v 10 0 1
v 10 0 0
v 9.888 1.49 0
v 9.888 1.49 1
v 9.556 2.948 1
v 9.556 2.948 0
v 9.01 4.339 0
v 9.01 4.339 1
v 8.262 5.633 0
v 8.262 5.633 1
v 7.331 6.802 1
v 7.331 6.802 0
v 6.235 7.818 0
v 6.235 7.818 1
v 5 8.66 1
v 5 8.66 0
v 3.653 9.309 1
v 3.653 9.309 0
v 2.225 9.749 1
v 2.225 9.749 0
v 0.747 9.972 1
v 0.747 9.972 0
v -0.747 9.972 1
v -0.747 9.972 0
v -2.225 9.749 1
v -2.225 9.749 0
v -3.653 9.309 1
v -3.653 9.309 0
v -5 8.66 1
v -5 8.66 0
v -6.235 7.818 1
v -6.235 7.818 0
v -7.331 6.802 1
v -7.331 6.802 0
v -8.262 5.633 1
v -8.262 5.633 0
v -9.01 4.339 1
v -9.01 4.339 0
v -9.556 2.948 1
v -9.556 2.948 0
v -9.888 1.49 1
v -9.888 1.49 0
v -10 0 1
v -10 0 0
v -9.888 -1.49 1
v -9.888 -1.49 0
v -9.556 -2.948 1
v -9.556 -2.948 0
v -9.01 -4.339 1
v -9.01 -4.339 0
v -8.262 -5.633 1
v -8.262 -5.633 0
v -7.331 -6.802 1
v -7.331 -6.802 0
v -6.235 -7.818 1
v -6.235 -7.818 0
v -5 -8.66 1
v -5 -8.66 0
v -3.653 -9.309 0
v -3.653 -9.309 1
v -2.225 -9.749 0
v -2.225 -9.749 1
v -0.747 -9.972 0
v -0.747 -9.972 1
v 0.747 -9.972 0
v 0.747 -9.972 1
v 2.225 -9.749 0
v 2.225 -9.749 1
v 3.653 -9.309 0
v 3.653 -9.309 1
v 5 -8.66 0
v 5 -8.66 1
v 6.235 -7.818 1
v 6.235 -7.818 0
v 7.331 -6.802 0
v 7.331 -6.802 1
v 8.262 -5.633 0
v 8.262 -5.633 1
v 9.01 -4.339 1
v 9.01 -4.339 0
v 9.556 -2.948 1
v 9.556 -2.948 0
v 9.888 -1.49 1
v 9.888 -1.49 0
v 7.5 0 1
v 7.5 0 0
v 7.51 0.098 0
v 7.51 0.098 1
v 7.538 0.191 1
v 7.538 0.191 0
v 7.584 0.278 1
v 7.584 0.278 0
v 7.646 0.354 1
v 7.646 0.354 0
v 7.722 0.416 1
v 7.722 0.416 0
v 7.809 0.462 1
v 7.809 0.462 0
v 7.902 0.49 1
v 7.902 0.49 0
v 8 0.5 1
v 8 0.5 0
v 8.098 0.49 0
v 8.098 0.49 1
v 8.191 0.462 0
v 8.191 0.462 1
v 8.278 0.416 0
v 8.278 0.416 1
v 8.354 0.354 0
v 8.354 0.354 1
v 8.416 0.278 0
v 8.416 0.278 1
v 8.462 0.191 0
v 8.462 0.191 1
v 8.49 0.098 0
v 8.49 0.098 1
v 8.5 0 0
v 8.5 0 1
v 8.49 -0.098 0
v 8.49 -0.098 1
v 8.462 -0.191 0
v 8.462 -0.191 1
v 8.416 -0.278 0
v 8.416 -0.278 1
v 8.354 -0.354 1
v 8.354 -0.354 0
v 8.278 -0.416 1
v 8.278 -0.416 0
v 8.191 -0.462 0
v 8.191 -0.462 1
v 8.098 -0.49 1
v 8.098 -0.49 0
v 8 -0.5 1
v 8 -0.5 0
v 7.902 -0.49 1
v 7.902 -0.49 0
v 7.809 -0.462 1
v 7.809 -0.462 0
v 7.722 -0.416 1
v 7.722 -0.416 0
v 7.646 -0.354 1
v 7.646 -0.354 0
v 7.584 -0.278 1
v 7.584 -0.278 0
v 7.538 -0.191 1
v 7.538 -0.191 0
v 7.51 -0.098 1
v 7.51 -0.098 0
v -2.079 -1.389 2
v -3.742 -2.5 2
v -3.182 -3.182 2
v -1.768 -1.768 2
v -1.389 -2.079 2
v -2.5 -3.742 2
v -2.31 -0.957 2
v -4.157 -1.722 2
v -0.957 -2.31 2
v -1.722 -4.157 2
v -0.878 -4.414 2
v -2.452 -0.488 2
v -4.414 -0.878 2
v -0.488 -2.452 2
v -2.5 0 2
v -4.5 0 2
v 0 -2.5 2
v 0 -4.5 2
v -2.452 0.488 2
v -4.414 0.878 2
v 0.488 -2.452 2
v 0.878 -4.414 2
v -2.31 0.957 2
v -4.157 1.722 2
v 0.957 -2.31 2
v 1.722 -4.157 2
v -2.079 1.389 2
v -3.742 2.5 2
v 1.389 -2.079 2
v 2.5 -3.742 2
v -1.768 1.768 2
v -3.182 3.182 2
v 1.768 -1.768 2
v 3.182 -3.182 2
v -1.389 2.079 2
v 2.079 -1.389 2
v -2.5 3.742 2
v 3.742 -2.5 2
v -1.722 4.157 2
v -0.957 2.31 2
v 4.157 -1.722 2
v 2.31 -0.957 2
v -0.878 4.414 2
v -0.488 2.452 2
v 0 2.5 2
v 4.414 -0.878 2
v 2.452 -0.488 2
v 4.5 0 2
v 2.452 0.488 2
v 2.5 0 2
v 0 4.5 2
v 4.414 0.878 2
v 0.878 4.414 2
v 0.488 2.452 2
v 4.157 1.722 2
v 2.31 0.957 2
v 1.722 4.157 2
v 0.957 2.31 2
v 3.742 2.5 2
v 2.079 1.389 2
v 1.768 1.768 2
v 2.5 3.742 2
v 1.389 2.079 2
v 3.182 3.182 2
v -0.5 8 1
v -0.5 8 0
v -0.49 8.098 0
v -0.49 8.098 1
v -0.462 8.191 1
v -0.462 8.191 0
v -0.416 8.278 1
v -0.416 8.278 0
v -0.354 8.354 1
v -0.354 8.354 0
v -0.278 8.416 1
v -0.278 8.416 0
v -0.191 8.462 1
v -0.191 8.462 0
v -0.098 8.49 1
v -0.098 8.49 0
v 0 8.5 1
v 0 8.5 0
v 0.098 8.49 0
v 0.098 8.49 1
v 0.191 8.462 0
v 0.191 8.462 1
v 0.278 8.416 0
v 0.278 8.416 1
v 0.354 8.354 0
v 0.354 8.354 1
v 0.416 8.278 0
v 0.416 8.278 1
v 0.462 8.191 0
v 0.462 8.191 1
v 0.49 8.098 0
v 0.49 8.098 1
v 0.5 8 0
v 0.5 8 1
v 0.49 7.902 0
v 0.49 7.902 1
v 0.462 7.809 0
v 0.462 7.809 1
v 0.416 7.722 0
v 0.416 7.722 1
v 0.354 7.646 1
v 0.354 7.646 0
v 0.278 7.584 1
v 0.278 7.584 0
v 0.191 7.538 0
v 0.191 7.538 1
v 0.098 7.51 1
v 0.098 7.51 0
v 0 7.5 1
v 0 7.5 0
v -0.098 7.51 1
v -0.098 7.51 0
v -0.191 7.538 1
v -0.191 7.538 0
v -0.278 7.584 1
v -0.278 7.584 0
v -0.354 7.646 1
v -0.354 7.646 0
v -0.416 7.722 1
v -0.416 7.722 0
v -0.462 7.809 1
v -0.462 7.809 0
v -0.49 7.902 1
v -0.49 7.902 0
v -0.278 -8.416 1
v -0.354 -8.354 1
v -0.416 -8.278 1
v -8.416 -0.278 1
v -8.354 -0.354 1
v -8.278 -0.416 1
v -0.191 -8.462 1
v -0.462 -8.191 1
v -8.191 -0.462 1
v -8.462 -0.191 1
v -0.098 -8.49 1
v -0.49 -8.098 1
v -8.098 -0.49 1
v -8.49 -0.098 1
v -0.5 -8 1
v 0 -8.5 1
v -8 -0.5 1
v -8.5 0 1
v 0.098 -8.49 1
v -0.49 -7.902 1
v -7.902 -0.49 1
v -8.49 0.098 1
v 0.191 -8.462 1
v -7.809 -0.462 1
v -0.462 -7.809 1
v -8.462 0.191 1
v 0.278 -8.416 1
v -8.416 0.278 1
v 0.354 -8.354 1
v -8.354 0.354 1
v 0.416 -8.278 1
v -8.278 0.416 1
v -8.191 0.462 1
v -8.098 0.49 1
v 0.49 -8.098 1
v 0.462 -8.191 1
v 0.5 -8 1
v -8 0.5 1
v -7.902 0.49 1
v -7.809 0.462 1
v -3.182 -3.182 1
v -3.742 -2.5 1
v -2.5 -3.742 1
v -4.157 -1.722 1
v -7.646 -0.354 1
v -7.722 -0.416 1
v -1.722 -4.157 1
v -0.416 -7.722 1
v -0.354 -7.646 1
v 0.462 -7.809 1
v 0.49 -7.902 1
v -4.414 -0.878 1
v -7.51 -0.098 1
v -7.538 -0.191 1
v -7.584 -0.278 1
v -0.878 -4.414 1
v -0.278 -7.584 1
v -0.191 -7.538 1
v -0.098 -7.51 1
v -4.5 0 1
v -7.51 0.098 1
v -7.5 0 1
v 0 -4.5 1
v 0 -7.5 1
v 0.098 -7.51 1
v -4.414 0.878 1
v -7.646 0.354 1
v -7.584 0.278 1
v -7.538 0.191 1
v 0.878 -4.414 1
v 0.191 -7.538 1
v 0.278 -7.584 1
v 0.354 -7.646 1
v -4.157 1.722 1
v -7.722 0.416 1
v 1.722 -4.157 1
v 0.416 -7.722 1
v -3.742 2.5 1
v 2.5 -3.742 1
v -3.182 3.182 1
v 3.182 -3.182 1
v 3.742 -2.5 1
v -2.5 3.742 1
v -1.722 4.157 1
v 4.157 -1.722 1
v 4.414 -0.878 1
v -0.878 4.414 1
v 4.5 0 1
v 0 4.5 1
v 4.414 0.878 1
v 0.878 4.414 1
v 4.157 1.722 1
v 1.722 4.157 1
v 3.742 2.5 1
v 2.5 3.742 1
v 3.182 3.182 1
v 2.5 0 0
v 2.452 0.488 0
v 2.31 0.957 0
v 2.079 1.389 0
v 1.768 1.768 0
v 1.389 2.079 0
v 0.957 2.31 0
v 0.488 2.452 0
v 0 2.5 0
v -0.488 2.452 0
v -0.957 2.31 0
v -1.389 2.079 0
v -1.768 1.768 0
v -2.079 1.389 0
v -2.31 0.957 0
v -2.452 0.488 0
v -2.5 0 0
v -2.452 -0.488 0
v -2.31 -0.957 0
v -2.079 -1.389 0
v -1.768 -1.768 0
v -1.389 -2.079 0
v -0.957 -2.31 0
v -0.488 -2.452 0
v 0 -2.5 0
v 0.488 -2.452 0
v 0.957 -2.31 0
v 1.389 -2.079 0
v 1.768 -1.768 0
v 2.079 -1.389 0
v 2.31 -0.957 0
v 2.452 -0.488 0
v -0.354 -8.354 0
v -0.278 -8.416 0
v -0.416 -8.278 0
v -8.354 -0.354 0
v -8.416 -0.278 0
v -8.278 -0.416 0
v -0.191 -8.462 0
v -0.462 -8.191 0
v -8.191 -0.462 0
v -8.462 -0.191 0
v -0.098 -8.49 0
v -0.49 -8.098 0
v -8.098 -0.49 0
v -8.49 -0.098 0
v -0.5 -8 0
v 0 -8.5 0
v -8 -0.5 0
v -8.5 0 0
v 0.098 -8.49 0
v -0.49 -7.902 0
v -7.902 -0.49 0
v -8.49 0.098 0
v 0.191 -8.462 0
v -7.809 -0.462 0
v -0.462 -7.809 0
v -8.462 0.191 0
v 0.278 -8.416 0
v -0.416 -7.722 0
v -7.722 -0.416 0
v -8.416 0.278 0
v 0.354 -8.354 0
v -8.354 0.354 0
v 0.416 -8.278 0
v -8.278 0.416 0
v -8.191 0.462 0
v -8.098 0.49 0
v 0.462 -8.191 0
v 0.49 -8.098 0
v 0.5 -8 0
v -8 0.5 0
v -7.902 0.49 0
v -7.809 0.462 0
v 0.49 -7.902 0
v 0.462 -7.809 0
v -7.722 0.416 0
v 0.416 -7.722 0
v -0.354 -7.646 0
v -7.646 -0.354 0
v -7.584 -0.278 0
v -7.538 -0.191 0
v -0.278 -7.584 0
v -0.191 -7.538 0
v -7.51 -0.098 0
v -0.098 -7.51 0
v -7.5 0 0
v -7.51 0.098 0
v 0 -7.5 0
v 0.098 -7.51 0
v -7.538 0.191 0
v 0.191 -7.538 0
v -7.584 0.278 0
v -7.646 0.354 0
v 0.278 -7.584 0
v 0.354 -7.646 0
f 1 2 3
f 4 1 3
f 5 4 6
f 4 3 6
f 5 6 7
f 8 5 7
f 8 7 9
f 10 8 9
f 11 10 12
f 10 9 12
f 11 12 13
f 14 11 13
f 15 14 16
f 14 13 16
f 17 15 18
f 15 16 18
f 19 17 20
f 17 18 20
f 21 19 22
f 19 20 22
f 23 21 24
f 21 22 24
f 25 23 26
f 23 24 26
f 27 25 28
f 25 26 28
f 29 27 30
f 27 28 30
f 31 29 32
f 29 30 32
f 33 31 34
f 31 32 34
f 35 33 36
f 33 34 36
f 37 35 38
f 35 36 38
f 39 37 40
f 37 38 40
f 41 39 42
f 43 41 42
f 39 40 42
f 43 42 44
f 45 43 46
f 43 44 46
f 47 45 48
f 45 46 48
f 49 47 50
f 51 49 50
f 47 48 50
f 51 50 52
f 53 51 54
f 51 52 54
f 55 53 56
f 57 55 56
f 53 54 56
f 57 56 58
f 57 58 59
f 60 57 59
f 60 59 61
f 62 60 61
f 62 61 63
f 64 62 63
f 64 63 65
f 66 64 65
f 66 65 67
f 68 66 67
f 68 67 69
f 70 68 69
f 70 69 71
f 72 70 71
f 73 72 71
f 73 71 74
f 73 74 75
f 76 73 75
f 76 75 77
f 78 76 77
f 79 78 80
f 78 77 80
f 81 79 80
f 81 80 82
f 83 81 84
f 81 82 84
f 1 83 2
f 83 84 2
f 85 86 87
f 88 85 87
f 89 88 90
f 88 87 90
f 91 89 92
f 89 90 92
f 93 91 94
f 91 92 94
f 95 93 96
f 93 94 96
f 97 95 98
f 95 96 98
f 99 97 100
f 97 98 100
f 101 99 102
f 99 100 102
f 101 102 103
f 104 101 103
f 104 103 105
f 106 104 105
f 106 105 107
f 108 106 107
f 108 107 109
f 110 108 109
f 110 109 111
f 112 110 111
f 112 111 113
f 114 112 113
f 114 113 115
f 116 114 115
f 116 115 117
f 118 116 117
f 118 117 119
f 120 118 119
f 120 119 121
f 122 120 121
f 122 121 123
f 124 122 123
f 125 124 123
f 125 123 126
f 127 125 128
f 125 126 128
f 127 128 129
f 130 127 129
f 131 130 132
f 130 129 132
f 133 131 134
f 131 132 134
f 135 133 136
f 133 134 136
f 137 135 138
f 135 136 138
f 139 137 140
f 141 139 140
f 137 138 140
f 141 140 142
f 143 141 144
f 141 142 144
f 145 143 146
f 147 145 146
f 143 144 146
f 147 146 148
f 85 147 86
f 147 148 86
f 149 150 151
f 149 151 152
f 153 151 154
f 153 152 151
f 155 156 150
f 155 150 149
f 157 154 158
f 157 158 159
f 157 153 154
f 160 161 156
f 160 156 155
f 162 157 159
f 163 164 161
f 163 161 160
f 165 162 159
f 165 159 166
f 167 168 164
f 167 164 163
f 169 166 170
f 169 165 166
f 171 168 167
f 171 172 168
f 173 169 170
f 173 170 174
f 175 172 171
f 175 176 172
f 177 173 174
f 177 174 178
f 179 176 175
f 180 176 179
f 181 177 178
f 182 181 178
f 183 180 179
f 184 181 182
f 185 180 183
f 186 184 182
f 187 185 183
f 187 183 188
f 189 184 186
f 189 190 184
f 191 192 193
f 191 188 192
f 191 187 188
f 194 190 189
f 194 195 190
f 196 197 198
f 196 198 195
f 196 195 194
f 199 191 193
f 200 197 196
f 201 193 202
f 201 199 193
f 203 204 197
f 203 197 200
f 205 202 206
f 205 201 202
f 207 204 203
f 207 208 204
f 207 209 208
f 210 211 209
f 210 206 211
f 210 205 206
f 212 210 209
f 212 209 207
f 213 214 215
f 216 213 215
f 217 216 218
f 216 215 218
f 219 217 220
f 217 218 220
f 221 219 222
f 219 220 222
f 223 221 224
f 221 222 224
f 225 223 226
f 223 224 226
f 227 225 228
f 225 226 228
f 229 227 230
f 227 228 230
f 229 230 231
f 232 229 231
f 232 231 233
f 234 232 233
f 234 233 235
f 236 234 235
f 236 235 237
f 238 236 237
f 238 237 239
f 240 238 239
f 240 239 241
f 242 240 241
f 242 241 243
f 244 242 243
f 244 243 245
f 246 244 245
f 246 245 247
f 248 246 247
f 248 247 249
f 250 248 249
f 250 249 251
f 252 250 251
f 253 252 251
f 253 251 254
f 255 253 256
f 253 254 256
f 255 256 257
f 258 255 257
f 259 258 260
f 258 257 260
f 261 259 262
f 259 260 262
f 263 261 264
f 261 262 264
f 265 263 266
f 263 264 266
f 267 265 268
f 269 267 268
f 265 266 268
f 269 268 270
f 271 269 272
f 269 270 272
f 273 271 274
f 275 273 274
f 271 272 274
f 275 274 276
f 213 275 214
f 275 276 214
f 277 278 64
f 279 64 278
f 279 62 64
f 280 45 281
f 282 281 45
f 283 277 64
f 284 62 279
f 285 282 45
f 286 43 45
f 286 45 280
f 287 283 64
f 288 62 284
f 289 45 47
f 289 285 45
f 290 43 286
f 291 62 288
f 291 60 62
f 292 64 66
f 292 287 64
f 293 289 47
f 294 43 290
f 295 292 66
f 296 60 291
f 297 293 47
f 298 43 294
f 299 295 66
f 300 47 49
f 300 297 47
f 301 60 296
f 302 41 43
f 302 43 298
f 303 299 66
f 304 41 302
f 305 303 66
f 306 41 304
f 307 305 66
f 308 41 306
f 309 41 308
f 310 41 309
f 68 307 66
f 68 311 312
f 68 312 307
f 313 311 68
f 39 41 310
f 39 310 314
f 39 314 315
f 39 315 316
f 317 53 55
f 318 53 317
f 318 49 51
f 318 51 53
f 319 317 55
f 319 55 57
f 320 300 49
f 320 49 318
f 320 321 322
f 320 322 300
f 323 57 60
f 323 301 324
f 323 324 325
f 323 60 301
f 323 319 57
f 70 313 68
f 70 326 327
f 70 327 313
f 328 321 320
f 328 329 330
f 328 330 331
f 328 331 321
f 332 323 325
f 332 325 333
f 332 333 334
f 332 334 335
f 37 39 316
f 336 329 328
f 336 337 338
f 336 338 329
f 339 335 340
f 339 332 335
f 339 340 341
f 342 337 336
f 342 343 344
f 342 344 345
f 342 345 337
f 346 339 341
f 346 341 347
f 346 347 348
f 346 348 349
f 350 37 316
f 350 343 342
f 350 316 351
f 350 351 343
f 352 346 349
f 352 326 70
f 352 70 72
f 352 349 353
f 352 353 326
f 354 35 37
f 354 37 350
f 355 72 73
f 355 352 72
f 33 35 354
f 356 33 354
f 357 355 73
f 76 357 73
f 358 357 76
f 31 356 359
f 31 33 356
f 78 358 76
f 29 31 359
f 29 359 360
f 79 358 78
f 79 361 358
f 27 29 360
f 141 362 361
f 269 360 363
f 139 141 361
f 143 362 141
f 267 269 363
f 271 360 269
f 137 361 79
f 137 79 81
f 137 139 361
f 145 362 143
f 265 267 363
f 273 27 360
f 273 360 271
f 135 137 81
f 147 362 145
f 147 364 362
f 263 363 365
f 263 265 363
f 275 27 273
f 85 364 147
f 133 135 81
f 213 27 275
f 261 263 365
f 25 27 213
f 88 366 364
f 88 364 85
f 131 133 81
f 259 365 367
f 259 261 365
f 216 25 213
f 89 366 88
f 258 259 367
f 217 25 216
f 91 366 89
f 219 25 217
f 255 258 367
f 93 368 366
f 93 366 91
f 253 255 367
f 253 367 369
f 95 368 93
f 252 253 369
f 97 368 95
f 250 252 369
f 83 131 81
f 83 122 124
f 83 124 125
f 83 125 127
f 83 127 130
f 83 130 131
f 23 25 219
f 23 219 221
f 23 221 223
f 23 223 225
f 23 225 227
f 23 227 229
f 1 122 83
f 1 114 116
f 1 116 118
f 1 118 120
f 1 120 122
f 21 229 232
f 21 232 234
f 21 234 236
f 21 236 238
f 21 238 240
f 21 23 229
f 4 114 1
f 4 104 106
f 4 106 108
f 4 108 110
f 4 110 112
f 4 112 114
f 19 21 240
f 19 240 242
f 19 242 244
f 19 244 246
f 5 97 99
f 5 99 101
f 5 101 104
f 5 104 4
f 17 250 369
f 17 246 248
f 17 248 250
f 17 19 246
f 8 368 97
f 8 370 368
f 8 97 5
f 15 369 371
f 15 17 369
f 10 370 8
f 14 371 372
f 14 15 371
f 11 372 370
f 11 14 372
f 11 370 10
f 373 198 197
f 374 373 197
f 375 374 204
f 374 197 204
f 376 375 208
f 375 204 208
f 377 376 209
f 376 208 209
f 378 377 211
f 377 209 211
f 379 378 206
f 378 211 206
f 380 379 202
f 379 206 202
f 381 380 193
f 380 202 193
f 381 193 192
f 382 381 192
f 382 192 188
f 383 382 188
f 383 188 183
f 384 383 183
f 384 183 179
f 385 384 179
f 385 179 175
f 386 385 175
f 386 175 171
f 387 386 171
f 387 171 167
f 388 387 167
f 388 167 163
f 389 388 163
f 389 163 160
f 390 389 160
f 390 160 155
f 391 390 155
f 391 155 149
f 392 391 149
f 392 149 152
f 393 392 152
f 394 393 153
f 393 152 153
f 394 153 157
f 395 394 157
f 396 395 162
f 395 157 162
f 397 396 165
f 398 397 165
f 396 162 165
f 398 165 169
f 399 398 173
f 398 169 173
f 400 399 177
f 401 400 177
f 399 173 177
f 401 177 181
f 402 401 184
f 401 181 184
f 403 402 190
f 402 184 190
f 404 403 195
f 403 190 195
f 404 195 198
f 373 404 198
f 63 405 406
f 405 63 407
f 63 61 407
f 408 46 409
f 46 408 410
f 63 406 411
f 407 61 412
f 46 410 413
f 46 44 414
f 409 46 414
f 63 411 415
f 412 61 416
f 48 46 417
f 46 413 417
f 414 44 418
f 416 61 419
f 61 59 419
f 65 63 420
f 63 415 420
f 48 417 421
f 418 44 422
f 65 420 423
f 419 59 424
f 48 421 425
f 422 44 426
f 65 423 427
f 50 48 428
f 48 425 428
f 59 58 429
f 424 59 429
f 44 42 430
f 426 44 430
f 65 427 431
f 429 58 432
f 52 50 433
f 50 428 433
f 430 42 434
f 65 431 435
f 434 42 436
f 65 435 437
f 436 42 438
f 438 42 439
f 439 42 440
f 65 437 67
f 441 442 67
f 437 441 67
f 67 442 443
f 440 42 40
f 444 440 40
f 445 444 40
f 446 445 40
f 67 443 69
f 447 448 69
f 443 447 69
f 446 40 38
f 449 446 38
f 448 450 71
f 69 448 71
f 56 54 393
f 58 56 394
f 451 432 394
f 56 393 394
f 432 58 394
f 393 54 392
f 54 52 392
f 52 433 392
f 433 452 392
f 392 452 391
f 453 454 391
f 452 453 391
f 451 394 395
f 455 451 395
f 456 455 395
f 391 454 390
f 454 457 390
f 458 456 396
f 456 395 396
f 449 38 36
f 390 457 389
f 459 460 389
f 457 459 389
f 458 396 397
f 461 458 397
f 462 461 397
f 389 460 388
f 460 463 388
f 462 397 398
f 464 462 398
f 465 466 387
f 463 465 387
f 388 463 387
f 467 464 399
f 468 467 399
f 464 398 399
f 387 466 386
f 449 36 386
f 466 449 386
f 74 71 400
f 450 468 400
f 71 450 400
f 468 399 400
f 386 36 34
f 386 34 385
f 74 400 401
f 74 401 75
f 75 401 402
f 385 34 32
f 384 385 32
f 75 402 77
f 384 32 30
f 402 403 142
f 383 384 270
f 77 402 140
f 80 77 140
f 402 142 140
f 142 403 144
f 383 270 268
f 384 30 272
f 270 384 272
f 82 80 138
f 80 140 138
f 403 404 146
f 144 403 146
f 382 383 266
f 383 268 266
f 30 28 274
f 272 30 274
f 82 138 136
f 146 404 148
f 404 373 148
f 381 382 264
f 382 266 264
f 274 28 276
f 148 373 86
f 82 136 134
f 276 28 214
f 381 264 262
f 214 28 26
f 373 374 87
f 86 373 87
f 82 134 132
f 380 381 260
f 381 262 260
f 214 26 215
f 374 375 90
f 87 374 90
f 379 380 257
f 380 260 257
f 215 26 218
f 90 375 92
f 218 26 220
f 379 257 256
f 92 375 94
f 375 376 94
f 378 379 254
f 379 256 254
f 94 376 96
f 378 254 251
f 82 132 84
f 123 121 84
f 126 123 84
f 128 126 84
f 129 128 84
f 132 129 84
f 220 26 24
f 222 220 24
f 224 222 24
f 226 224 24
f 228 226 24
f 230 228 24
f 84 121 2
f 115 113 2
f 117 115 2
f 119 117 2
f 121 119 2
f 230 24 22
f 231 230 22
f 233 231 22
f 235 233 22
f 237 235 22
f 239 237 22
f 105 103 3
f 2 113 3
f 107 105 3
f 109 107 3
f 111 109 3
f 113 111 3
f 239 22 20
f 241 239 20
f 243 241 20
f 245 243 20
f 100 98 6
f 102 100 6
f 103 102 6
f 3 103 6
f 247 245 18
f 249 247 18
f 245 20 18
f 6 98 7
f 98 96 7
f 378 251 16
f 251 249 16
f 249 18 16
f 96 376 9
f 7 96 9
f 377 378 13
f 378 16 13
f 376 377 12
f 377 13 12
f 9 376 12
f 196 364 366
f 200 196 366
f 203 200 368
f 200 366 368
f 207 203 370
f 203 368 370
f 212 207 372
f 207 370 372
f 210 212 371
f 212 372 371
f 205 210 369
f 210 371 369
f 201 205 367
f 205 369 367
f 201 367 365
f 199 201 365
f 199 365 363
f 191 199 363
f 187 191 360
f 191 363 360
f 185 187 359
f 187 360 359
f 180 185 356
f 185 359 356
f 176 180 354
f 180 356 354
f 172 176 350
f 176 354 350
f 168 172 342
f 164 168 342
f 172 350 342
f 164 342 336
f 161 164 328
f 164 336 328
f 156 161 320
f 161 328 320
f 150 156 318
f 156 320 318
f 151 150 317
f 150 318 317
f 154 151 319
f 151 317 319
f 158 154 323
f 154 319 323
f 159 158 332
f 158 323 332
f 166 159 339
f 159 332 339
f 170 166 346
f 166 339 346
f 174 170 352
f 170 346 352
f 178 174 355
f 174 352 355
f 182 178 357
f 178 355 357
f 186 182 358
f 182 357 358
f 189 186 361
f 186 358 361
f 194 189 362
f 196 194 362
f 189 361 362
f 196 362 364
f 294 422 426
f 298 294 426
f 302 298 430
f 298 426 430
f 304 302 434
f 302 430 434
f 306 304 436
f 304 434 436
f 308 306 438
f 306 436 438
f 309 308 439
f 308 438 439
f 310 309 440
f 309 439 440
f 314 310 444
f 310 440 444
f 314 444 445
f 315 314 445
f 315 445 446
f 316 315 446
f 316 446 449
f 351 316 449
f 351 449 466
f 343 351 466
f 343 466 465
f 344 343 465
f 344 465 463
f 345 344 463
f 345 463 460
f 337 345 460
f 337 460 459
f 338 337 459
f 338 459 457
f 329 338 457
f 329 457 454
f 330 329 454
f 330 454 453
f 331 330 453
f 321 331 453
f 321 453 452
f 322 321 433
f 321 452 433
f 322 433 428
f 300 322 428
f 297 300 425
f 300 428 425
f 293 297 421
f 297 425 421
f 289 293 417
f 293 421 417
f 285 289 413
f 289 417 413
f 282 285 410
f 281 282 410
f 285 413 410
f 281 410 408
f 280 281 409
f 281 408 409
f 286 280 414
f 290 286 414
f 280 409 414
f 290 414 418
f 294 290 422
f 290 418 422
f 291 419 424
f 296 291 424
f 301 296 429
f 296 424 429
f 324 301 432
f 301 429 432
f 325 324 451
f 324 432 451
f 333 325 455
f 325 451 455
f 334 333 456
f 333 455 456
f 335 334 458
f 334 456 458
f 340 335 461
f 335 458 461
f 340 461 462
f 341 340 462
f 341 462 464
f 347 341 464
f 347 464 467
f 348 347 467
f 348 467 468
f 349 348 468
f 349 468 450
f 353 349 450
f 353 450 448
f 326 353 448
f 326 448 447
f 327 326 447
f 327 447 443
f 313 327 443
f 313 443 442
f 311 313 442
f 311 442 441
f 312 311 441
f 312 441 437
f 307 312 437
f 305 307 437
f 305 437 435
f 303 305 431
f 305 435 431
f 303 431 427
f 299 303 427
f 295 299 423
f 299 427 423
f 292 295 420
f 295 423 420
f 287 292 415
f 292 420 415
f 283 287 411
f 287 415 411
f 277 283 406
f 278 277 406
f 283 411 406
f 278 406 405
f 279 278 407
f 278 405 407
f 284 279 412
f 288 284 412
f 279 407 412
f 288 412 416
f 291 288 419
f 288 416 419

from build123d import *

# Parameters (mm, degrees)
SKETCH_1_R          = 10
EXTRUDE_1_DEPTH     = 1
SKETCH_2_R          = 4.5
EXTRUDE_2_DEPTH     = 1
SKETCH_3_R          = 2.5
CUT_EXTRUDE_1_DEPTH = 15.282856857
SKETCH_4_R          = 0.5
CUT_EXTRUDE_2_DEPTH = 15.282856857


with BuildPart() as part:
    # 草图1 → 凸台-拉伸1 (new body)
    with BuildSketch(Plane.XY):
        Circle(SKETCH_1_R)
    extrude(amount=EXTRUDE_1_DEPTH)

    # 草图2 → 凸台-拉伸2 (add)
    with BuildSketch(Plane.XY.offset(1)):
        Circle(SKETCH_2_R)
    extrude(amount=EXTRUDE_2_DEPTH)

    # 草图3 → 切除-拉伸1 (cut, through all)
    with BuildSketch(Plane.XY.offset(2)):
        Circle(SKETCH_3_R)
    extrude(amount=-CUT_EXTRUDE_1_DEPTH, mode=Mode.SUBTRACT)

    # 草图4 → 切除-拉伸2 (cut, through all)
    with BuildSketch(Plane(origin=(0, 0, 0), x_dir=(-1, 0, 0), z_dir=(0, 0, -1))):
        with Locations((0, 8)):
            Circle(SKETCH_4_R)
        with Locations((8, 0)):
            Circle(SKETCH_4_R)
        with Locations((0, -8)):
            Circle(SKETCH_4_R)
        with Locations((-8, 0)):
            Circle(SKETCH_4_R)
    extrude(amount=-CUT_EXTRUDE_2_DEPTH, mode=Mode.SUBTRACT)


solid = part.part
